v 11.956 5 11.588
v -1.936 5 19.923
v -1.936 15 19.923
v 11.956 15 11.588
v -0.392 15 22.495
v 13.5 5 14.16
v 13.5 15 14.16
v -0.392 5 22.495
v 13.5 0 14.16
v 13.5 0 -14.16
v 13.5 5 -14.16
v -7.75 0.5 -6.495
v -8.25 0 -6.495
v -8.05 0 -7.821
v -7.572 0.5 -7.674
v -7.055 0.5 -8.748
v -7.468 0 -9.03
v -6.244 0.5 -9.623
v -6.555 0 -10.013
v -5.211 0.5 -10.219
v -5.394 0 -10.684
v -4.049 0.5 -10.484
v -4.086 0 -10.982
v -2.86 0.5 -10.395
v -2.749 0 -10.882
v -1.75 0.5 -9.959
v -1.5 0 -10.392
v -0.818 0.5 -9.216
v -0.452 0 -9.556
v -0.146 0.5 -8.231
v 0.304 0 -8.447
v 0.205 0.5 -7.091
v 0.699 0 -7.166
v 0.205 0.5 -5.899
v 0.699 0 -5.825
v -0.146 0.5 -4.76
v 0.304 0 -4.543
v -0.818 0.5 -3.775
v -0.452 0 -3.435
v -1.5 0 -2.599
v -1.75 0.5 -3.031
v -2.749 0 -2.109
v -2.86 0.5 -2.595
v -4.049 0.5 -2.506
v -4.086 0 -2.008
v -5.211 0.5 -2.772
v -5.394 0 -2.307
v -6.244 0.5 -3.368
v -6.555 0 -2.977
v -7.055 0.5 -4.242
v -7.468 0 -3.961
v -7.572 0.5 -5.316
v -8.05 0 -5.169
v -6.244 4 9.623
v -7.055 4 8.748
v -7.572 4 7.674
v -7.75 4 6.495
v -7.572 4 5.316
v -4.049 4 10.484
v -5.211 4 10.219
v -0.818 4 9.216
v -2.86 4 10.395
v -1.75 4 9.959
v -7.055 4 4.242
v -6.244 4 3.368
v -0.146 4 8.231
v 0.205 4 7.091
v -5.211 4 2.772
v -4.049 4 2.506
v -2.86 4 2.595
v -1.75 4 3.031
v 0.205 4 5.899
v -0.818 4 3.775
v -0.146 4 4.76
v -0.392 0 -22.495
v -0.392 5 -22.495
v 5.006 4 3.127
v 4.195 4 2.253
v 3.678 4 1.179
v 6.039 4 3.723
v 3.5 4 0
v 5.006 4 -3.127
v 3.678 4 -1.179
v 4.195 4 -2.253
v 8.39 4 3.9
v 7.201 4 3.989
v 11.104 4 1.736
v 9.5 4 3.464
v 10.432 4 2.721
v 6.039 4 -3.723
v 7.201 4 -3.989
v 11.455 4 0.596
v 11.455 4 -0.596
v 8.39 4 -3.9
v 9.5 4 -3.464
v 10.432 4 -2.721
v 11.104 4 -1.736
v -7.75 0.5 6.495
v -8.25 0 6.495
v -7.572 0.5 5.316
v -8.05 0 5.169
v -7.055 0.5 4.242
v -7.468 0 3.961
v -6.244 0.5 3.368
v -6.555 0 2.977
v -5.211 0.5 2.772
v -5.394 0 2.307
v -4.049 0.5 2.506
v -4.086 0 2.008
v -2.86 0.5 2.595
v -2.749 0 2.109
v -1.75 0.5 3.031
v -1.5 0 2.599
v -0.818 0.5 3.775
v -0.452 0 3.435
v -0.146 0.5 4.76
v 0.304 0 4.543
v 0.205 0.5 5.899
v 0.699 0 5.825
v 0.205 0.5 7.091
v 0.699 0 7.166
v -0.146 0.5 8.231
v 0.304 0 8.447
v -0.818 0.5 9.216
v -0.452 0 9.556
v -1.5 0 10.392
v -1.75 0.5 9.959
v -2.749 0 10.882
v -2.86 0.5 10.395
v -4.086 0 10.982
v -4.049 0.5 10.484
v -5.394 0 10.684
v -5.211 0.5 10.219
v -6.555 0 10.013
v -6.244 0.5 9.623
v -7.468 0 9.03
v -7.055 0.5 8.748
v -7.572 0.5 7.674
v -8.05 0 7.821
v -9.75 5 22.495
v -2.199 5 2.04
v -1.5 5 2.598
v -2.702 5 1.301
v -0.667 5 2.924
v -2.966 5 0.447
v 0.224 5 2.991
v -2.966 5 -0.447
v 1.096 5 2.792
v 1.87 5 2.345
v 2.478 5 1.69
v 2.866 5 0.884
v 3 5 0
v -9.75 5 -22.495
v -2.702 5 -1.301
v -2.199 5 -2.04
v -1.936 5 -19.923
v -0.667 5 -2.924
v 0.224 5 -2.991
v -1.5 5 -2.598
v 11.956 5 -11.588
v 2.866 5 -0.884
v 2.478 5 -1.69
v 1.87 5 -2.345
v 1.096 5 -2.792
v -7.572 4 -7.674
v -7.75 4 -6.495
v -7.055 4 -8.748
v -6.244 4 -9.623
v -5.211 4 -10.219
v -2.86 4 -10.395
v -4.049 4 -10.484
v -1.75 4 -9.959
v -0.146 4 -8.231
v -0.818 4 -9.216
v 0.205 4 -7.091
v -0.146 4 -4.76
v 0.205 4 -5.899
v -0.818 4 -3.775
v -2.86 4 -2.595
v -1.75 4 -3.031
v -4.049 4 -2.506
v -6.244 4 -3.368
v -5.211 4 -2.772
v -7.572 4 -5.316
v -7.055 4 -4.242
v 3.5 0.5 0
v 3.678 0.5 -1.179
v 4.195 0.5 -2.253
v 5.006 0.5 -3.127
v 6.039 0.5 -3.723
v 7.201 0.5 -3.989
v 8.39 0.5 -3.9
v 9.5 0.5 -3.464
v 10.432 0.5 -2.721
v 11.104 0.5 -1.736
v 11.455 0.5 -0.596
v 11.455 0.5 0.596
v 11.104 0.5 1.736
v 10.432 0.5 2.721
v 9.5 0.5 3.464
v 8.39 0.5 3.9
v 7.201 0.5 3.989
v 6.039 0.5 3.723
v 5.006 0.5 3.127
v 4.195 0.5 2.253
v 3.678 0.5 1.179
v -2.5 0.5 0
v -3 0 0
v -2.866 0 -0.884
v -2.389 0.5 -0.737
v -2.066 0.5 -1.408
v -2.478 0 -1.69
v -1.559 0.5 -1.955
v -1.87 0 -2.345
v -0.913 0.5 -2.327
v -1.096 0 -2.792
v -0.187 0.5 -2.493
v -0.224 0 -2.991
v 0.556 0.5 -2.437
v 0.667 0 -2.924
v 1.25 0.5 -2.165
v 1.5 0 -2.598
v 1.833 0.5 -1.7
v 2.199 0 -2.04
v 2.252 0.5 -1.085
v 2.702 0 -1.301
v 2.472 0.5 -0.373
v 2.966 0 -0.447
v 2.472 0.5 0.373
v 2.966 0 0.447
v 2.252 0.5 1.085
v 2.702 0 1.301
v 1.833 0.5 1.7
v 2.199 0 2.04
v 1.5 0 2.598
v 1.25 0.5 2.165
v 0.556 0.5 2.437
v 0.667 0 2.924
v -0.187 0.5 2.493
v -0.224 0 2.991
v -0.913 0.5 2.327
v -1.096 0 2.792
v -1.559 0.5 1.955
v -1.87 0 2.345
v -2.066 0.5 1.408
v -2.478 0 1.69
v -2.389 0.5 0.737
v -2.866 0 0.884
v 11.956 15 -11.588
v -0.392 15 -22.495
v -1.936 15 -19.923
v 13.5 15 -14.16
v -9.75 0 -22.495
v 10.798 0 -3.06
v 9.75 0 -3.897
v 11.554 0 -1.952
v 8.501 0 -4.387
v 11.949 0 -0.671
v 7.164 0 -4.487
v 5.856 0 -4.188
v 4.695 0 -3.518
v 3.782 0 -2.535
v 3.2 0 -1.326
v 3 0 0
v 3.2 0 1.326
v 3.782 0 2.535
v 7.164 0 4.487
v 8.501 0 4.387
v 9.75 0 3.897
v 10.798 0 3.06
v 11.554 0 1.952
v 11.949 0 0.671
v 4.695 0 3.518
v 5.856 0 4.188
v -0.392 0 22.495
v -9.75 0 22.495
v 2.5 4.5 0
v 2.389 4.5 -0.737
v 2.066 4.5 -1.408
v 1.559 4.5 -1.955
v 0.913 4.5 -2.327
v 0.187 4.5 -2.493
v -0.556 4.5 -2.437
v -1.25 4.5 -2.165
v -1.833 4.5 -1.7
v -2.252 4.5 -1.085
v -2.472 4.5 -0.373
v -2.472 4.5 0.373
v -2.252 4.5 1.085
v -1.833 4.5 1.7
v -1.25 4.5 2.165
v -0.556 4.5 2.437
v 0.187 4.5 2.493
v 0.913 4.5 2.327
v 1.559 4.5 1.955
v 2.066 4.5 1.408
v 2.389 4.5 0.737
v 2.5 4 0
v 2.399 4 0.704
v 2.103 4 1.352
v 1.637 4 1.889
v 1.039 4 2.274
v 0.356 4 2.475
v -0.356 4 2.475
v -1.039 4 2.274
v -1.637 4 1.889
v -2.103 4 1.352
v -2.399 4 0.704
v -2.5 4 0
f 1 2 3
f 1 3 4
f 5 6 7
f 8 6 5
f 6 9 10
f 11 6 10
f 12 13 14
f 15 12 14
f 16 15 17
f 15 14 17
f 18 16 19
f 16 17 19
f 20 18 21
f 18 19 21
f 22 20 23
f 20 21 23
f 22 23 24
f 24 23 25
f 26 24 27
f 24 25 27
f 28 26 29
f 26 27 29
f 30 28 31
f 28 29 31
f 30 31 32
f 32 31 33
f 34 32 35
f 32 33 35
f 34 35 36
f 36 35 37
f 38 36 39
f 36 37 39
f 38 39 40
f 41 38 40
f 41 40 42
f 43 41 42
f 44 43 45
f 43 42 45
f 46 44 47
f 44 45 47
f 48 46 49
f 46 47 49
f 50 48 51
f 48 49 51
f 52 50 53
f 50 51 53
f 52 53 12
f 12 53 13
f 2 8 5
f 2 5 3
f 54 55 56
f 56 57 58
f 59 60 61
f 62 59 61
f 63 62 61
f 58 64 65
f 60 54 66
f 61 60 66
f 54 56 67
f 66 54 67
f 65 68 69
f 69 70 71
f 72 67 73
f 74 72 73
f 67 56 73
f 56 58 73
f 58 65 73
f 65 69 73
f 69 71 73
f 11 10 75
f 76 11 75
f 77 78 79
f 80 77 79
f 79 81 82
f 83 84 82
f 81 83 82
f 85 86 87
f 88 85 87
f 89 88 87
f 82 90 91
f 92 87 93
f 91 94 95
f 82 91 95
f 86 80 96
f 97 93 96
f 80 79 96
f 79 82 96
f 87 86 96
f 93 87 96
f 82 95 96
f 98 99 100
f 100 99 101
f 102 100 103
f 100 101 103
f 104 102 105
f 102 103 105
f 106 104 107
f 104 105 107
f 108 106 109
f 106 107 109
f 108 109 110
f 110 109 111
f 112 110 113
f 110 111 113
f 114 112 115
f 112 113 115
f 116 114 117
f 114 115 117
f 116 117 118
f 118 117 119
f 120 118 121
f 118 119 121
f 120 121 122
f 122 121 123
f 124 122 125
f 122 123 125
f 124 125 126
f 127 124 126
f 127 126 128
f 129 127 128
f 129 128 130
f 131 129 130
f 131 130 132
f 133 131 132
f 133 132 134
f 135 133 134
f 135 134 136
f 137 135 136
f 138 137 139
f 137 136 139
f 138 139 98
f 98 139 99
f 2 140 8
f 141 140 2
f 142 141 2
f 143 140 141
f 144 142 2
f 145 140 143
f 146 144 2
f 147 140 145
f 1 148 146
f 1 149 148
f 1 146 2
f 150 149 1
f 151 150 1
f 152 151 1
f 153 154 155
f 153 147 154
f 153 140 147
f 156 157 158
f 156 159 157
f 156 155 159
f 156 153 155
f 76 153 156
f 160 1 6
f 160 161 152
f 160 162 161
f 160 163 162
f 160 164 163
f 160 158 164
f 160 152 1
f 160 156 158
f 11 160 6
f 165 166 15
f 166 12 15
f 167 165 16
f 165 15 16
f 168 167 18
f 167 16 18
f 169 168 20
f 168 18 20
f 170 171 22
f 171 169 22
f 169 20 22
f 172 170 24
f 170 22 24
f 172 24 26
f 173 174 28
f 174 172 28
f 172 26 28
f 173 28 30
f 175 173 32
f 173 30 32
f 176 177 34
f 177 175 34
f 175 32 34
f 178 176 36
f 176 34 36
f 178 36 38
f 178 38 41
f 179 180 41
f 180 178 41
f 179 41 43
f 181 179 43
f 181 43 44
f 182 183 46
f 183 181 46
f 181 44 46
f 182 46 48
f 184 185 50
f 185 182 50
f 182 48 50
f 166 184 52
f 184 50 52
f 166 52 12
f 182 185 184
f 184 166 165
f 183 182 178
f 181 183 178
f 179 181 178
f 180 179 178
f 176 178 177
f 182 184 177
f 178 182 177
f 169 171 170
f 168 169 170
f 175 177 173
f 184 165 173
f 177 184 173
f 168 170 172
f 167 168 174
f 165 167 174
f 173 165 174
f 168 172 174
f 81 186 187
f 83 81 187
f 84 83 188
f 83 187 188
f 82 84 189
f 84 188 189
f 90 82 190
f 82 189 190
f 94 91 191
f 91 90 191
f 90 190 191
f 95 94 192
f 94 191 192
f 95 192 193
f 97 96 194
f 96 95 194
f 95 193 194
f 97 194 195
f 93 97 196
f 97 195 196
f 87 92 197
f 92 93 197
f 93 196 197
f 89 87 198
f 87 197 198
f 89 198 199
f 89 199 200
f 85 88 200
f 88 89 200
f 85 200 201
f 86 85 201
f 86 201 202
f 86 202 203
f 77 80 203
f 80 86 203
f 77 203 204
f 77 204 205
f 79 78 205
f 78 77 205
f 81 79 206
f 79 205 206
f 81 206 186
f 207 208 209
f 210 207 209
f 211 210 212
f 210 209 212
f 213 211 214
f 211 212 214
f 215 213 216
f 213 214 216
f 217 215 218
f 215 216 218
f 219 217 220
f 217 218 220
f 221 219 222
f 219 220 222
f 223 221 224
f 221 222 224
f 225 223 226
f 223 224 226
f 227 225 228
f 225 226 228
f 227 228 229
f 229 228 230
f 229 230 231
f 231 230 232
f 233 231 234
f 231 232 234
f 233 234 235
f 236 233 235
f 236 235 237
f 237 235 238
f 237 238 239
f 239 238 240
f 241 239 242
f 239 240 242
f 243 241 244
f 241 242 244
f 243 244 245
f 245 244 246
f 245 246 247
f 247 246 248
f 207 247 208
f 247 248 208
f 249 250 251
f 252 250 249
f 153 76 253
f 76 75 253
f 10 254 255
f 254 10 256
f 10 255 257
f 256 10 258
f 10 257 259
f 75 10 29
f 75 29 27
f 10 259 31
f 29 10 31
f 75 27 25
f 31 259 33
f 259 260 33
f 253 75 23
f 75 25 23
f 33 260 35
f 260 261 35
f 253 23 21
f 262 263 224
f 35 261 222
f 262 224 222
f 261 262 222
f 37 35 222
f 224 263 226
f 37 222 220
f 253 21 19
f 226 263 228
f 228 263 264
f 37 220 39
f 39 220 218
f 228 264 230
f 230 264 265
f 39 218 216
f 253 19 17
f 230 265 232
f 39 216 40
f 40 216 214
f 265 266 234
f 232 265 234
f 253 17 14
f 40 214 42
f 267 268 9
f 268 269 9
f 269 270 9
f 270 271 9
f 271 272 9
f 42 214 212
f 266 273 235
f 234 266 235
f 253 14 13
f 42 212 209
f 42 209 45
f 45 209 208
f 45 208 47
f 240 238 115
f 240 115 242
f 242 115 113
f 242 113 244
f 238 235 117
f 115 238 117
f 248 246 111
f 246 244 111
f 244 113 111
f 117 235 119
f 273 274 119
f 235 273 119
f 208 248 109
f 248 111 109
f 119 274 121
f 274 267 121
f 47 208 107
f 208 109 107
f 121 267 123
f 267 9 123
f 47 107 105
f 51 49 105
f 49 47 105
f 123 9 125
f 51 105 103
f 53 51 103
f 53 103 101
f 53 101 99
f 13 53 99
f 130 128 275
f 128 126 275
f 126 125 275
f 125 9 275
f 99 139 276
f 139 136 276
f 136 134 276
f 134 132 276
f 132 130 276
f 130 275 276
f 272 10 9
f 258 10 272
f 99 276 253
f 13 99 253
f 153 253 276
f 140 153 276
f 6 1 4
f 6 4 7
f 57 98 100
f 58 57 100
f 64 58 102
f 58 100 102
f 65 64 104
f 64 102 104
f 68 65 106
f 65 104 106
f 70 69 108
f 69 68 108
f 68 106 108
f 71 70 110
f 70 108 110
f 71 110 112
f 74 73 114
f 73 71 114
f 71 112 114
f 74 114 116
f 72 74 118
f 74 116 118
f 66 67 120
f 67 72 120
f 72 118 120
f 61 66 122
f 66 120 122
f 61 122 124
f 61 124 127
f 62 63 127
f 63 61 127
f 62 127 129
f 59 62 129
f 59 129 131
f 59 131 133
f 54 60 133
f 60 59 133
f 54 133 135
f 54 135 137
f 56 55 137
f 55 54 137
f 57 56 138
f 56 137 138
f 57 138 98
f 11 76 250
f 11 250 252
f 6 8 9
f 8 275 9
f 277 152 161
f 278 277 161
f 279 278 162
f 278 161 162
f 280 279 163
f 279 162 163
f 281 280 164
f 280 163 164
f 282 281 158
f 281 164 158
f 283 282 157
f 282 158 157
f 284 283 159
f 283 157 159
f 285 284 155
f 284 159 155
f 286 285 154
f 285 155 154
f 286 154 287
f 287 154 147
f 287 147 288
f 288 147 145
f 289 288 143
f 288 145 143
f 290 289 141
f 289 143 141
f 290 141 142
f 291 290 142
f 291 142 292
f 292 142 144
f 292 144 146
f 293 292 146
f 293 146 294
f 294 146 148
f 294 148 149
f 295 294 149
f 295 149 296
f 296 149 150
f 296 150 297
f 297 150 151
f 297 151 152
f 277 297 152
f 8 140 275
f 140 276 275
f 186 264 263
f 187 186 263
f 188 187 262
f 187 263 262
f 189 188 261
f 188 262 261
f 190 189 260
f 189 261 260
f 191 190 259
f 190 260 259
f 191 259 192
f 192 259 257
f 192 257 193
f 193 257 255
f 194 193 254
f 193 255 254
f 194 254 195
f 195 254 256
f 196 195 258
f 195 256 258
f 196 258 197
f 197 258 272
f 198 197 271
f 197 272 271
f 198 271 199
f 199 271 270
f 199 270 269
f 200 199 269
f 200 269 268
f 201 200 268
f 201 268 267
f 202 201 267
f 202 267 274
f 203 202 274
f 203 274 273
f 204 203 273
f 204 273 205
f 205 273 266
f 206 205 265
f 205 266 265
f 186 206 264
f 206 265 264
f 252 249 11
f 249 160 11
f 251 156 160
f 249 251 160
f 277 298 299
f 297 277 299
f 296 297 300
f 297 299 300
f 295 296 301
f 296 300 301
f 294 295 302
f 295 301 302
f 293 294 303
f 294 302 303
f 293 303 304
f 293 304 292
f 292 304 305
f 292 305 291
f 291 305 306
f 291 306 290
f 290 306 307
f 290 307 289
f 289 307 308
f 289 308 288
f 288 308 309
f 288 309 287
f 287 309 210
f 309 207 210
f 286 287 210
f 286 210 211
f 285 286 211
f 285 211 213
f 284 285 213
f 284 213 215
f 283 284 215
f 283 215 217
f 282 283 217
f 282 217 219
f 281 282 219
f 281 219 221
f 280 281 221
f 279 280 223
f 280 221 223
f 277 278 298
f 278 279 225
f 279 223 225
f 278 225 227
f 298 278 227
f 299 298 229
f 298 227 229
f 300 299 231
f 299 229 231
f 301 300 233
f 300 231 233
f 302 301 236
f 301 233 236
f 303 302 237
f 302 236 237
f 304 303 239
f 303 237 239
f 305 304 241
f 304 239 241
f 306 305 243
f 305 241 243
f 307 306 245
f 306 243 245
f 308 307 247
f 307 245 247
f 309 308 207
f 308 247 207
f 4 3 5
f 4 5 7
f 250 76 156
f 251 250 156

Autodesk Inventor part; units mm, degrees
ref_plane "YZ Plane" through (0, 0, 0) normal (1, 0, 0) x (0, 1, 0)
ref_plane "XZ Plane" through (0, 0, 0) normal (0, 1, 0) x (-1, 0, 0)
ref_plane "XY Plane" through (0, 0, 0) normal (0, 0, 1) x (1, 0, 0)
sketch "Sketch1" plane through (0, 0, 0) normal (0, 1, 0) x (-1, 0, 0)
  line L0 (-13.5, -18.4952) -> (9.75, -18.4952)
  line L1 (9.75, -18.4952) -> (9.75, 18.4952)
  line L2 (9.75, 18.4952) -> (-13.5, 18.4952)
  line L3 (-13.5, 18.4952) -> (-13.5, -18.4952)
  circle A0 centre (-7.5, 0) radius 4
  circle A1 centre (3.75, -6.4952) radius 4
  circle A2 centre (3.75, 6.4952) radius 4
  circle A3 centre (0, 0) radius 7.5 construction
  circle A4 centre (0, 0) radius 2.5
  dimension "d11" = 15
  dimension "d2" = 8
  dimension "d6" = 360
  dimension "d8" = 6
  dimension "d9" = 6
  dimension "d1" = 12
  dimension "d13" = 12
  dimension "d35" = 5
extrude "Extrusion1" add sketch "Sketch1" along normal blind 4
sketch "Sketch2" plane through (0, 4, 0) normal (0, 1, 0) x (1, 0, 0)
  circle A0 centre (-3.75, -6.4952) radius 4 projected
  circle A1 centre (-3.75, 6.4952) radius 4 projected
  circle A2 centre (7.5, 0) radius 4 projected
  line L0 (13.5, 18.4952) -> (-9.75, 18.4952) projected
  line L1 (-9.75, 18.4952) -> (-9.75, -18.4952) projected
  line L2 (-9.75, -18.4952) -> (13.5, -18.4952) projected
  line L3 (13.5, -18.4952) -> (13.5, 18.4952) projected
  circle A3 centre (0, 0) radius 2.5
  dimension "d16" = 5
extrude "Extrusion2" add sketch "Sketch2" along normal blind 1 contours A0 | A1 | A2 | L3 L2 L1 L0
sketch "Sketch3" plane through (0, 0, 0) normal (0, -1, 0) x (1, 0, 0)
  circle A0 centre (-3.75, 6.4952) radius 4 projected
  circle A1 centre (-3.75, -6.4952) radius 4 projected
  circle A2 centre (7.5, 0) radius 4 projected
  line L0 (13.5, -18.4952) -> (-9.75, -18.4952) projected
  line L1 (13.5, 18.4952) -> (13.5, -18.4952) projected
  line L2 (-9.75, 18.4952) -> (13.5, 18.4952) projected
  line L3 (-9.75, -18.4952) -> (-9.75, 18.4952) construction
  line L4 (-1.5, 18.4952) -> (13.5, 9.4952)
  line L5 (13.5, 18.4952) -> (13.5, -18.4952) projected
  line L6 (13.5, -9.4952) -> (-1.5, -18.4952)
  point P0 (0, 0)
  dimension "d19" = 9
  dimension "d20" = 9
  dimension "d21" = 15
  dimension "d22" = 15
extrude "Extrusion3" cut sketch "Sketch3" against normal through all contours L4 L2 L1 | L0 L6 L1
sketch "Sketch5" plane through (0, 0, 0) normal (0, -1, 0) x (1, 0, 0)
  line L0 (13.5, 9.4952) -> (-1.5, 18.4952) projected
  line L1 (-9.75, 18.4952) -> (-1.5, 18.4952) projected
  line L2 (-9.75, -18.4952) -> (-9.75, 18.4952) projected
  line L3 (-1.5, -18.4952) -> (-9.75, -18.4952) projected
  line L4 (-1.5, -18.4952) -> (13.5, -9.4952) projected
  line L5 (13.5, 9.4952) -> (13.5, -9.4952) projected
  circle A0 centre (-3.75, 6.4952) radius 4 projected
  circle A1 centre (-3.75, -6.4952) radius 4 projected
  circle A2 centre (7.5, 0) radius 4 projected
  line L6 (17.5, -11.76) -> (-0.3921, -22.4952)
  line L7 (-0.3921, -22.4952) -> (-13.75, -22.4952)
  line L8 (-13.75, -22.4952) -> (-13.75, 22.4952)
  line L9 (-13.75, 22.4952) -> (-0.3921, 22.4952)
  line L10 (-0.3921, 22.4952) -> (17.5, 11.76)
  line L11 (17.5, 11.76) -> (17.5, -11.76)
  line L12 (13.5, -9.4952) -> (13.5, -14.16)
  line L13 (13.5, 3.4118) -> (13.5, 14.16)
  line L14 (-1.5, -18.4952) -> (-9.75, -18.4952) projected
  line L15 (-9.75, -18.4952) -> (-9.75, -22.4952)
  line L16 (-9.75, 18.4952) -> (-1.5, 18.4952) projected
  line L17 (-9.75, 18.4952) -> (-9.75, 22.4952)
  line L18 (-1.5, -18.4952) -> (13.5, -9.4952) projected
  line L19 (13.5, -9.4952) -> (-1.5, -18.4952)
  line L20 (-1.5, -18.4952) -> (-9.75, -18.4952)
  line L21 (-9.75, -18.4952) -> (-9.75, 18.4952) projected
  line L22 (-9.75, 18.4952) -> (-1.5, 18.4952)
  line L23 (13.5, 9.4952) -> (-1.5, 18.4952) projected
  line L24 (13.5, 9.4952) -> (-1.5, 18.4952)
  line L25 (13.5, -9.4952) -> (13.5, 3.4118)
  point P0 (0, 0)
  dimension "d27" = 4
extrude "Extrusion5" add sketch "Sketch5" against normal up to surface (5 mm away) contours L0 L1 L17 L9 L10 L13 | L12 L6 L7 L15 L3 L4
sketch "Sketch6" plane through (0, 5, 0) normal (0, 1, 0) x (1, 0, 0)
  line L0 (13.5, -14.16) -> (13.5, 14.16) projected
  line L1 (-0.3921, 22.4952) -> (13.5, 14.16) projected
  line L2 (-9.75, 22.4952) -> (-0.3921, 22.4952) projected
  line L3 (-9.75, -22.4952) -> (-9.75, 22.4952) projected
  line L4 (-0.3921, -22.4952) -> (-9.75, -22.4952) projected
  line L5 (13.5, -14.16) -> (-0.3921, -22.4952) projected
  line L6 (13.5, 14.16) -> (-0.3921, 22.4952)
  line L7 (-0.3921, 22.4952) -> (-1.9356, 19.9227)
  line L8 (-1.9356, 19.9227) -> (11.9565, 11.5875)
  line L9 (11.9565, 11.5875) -> (13.5, 14.16)
  line L10 (13.5, -14.16) -> (13.5, 14.16) projected
  line L11 (13.5, -14.16) -> (-0.3921, -22.4952)
  line L12 (-0.3921, -22.4952) -> (-1.9356, -19.9227)
  line L13 (-1.9356, -19.9227) -> (11.9565, -11.5875)
  line L14 (11.9565, -11.5875) -> (13.5, -14.16)
  point P0 (0, 0)
  dimension "d30" = 3
  dimension "d31" = 3
extrude "Extrusion6" add sketch "Sketch6" along normal blind 10 contours L5 L12 L13 L14 | L9 L8 L7 L1
chamfer "Chamfer1" distance 0.5 angle 45 5 edges at (2.5, 0, 0) (-2.5, 5, 0) (0.25, 0, 6.4952) (11.5, 0, 0) (0.25, 0, -6.4952)
equation "\"d13\" = d1"
properties part number "30_Cube_Z_Focus_Drylin_NEMA_slide_part1"
